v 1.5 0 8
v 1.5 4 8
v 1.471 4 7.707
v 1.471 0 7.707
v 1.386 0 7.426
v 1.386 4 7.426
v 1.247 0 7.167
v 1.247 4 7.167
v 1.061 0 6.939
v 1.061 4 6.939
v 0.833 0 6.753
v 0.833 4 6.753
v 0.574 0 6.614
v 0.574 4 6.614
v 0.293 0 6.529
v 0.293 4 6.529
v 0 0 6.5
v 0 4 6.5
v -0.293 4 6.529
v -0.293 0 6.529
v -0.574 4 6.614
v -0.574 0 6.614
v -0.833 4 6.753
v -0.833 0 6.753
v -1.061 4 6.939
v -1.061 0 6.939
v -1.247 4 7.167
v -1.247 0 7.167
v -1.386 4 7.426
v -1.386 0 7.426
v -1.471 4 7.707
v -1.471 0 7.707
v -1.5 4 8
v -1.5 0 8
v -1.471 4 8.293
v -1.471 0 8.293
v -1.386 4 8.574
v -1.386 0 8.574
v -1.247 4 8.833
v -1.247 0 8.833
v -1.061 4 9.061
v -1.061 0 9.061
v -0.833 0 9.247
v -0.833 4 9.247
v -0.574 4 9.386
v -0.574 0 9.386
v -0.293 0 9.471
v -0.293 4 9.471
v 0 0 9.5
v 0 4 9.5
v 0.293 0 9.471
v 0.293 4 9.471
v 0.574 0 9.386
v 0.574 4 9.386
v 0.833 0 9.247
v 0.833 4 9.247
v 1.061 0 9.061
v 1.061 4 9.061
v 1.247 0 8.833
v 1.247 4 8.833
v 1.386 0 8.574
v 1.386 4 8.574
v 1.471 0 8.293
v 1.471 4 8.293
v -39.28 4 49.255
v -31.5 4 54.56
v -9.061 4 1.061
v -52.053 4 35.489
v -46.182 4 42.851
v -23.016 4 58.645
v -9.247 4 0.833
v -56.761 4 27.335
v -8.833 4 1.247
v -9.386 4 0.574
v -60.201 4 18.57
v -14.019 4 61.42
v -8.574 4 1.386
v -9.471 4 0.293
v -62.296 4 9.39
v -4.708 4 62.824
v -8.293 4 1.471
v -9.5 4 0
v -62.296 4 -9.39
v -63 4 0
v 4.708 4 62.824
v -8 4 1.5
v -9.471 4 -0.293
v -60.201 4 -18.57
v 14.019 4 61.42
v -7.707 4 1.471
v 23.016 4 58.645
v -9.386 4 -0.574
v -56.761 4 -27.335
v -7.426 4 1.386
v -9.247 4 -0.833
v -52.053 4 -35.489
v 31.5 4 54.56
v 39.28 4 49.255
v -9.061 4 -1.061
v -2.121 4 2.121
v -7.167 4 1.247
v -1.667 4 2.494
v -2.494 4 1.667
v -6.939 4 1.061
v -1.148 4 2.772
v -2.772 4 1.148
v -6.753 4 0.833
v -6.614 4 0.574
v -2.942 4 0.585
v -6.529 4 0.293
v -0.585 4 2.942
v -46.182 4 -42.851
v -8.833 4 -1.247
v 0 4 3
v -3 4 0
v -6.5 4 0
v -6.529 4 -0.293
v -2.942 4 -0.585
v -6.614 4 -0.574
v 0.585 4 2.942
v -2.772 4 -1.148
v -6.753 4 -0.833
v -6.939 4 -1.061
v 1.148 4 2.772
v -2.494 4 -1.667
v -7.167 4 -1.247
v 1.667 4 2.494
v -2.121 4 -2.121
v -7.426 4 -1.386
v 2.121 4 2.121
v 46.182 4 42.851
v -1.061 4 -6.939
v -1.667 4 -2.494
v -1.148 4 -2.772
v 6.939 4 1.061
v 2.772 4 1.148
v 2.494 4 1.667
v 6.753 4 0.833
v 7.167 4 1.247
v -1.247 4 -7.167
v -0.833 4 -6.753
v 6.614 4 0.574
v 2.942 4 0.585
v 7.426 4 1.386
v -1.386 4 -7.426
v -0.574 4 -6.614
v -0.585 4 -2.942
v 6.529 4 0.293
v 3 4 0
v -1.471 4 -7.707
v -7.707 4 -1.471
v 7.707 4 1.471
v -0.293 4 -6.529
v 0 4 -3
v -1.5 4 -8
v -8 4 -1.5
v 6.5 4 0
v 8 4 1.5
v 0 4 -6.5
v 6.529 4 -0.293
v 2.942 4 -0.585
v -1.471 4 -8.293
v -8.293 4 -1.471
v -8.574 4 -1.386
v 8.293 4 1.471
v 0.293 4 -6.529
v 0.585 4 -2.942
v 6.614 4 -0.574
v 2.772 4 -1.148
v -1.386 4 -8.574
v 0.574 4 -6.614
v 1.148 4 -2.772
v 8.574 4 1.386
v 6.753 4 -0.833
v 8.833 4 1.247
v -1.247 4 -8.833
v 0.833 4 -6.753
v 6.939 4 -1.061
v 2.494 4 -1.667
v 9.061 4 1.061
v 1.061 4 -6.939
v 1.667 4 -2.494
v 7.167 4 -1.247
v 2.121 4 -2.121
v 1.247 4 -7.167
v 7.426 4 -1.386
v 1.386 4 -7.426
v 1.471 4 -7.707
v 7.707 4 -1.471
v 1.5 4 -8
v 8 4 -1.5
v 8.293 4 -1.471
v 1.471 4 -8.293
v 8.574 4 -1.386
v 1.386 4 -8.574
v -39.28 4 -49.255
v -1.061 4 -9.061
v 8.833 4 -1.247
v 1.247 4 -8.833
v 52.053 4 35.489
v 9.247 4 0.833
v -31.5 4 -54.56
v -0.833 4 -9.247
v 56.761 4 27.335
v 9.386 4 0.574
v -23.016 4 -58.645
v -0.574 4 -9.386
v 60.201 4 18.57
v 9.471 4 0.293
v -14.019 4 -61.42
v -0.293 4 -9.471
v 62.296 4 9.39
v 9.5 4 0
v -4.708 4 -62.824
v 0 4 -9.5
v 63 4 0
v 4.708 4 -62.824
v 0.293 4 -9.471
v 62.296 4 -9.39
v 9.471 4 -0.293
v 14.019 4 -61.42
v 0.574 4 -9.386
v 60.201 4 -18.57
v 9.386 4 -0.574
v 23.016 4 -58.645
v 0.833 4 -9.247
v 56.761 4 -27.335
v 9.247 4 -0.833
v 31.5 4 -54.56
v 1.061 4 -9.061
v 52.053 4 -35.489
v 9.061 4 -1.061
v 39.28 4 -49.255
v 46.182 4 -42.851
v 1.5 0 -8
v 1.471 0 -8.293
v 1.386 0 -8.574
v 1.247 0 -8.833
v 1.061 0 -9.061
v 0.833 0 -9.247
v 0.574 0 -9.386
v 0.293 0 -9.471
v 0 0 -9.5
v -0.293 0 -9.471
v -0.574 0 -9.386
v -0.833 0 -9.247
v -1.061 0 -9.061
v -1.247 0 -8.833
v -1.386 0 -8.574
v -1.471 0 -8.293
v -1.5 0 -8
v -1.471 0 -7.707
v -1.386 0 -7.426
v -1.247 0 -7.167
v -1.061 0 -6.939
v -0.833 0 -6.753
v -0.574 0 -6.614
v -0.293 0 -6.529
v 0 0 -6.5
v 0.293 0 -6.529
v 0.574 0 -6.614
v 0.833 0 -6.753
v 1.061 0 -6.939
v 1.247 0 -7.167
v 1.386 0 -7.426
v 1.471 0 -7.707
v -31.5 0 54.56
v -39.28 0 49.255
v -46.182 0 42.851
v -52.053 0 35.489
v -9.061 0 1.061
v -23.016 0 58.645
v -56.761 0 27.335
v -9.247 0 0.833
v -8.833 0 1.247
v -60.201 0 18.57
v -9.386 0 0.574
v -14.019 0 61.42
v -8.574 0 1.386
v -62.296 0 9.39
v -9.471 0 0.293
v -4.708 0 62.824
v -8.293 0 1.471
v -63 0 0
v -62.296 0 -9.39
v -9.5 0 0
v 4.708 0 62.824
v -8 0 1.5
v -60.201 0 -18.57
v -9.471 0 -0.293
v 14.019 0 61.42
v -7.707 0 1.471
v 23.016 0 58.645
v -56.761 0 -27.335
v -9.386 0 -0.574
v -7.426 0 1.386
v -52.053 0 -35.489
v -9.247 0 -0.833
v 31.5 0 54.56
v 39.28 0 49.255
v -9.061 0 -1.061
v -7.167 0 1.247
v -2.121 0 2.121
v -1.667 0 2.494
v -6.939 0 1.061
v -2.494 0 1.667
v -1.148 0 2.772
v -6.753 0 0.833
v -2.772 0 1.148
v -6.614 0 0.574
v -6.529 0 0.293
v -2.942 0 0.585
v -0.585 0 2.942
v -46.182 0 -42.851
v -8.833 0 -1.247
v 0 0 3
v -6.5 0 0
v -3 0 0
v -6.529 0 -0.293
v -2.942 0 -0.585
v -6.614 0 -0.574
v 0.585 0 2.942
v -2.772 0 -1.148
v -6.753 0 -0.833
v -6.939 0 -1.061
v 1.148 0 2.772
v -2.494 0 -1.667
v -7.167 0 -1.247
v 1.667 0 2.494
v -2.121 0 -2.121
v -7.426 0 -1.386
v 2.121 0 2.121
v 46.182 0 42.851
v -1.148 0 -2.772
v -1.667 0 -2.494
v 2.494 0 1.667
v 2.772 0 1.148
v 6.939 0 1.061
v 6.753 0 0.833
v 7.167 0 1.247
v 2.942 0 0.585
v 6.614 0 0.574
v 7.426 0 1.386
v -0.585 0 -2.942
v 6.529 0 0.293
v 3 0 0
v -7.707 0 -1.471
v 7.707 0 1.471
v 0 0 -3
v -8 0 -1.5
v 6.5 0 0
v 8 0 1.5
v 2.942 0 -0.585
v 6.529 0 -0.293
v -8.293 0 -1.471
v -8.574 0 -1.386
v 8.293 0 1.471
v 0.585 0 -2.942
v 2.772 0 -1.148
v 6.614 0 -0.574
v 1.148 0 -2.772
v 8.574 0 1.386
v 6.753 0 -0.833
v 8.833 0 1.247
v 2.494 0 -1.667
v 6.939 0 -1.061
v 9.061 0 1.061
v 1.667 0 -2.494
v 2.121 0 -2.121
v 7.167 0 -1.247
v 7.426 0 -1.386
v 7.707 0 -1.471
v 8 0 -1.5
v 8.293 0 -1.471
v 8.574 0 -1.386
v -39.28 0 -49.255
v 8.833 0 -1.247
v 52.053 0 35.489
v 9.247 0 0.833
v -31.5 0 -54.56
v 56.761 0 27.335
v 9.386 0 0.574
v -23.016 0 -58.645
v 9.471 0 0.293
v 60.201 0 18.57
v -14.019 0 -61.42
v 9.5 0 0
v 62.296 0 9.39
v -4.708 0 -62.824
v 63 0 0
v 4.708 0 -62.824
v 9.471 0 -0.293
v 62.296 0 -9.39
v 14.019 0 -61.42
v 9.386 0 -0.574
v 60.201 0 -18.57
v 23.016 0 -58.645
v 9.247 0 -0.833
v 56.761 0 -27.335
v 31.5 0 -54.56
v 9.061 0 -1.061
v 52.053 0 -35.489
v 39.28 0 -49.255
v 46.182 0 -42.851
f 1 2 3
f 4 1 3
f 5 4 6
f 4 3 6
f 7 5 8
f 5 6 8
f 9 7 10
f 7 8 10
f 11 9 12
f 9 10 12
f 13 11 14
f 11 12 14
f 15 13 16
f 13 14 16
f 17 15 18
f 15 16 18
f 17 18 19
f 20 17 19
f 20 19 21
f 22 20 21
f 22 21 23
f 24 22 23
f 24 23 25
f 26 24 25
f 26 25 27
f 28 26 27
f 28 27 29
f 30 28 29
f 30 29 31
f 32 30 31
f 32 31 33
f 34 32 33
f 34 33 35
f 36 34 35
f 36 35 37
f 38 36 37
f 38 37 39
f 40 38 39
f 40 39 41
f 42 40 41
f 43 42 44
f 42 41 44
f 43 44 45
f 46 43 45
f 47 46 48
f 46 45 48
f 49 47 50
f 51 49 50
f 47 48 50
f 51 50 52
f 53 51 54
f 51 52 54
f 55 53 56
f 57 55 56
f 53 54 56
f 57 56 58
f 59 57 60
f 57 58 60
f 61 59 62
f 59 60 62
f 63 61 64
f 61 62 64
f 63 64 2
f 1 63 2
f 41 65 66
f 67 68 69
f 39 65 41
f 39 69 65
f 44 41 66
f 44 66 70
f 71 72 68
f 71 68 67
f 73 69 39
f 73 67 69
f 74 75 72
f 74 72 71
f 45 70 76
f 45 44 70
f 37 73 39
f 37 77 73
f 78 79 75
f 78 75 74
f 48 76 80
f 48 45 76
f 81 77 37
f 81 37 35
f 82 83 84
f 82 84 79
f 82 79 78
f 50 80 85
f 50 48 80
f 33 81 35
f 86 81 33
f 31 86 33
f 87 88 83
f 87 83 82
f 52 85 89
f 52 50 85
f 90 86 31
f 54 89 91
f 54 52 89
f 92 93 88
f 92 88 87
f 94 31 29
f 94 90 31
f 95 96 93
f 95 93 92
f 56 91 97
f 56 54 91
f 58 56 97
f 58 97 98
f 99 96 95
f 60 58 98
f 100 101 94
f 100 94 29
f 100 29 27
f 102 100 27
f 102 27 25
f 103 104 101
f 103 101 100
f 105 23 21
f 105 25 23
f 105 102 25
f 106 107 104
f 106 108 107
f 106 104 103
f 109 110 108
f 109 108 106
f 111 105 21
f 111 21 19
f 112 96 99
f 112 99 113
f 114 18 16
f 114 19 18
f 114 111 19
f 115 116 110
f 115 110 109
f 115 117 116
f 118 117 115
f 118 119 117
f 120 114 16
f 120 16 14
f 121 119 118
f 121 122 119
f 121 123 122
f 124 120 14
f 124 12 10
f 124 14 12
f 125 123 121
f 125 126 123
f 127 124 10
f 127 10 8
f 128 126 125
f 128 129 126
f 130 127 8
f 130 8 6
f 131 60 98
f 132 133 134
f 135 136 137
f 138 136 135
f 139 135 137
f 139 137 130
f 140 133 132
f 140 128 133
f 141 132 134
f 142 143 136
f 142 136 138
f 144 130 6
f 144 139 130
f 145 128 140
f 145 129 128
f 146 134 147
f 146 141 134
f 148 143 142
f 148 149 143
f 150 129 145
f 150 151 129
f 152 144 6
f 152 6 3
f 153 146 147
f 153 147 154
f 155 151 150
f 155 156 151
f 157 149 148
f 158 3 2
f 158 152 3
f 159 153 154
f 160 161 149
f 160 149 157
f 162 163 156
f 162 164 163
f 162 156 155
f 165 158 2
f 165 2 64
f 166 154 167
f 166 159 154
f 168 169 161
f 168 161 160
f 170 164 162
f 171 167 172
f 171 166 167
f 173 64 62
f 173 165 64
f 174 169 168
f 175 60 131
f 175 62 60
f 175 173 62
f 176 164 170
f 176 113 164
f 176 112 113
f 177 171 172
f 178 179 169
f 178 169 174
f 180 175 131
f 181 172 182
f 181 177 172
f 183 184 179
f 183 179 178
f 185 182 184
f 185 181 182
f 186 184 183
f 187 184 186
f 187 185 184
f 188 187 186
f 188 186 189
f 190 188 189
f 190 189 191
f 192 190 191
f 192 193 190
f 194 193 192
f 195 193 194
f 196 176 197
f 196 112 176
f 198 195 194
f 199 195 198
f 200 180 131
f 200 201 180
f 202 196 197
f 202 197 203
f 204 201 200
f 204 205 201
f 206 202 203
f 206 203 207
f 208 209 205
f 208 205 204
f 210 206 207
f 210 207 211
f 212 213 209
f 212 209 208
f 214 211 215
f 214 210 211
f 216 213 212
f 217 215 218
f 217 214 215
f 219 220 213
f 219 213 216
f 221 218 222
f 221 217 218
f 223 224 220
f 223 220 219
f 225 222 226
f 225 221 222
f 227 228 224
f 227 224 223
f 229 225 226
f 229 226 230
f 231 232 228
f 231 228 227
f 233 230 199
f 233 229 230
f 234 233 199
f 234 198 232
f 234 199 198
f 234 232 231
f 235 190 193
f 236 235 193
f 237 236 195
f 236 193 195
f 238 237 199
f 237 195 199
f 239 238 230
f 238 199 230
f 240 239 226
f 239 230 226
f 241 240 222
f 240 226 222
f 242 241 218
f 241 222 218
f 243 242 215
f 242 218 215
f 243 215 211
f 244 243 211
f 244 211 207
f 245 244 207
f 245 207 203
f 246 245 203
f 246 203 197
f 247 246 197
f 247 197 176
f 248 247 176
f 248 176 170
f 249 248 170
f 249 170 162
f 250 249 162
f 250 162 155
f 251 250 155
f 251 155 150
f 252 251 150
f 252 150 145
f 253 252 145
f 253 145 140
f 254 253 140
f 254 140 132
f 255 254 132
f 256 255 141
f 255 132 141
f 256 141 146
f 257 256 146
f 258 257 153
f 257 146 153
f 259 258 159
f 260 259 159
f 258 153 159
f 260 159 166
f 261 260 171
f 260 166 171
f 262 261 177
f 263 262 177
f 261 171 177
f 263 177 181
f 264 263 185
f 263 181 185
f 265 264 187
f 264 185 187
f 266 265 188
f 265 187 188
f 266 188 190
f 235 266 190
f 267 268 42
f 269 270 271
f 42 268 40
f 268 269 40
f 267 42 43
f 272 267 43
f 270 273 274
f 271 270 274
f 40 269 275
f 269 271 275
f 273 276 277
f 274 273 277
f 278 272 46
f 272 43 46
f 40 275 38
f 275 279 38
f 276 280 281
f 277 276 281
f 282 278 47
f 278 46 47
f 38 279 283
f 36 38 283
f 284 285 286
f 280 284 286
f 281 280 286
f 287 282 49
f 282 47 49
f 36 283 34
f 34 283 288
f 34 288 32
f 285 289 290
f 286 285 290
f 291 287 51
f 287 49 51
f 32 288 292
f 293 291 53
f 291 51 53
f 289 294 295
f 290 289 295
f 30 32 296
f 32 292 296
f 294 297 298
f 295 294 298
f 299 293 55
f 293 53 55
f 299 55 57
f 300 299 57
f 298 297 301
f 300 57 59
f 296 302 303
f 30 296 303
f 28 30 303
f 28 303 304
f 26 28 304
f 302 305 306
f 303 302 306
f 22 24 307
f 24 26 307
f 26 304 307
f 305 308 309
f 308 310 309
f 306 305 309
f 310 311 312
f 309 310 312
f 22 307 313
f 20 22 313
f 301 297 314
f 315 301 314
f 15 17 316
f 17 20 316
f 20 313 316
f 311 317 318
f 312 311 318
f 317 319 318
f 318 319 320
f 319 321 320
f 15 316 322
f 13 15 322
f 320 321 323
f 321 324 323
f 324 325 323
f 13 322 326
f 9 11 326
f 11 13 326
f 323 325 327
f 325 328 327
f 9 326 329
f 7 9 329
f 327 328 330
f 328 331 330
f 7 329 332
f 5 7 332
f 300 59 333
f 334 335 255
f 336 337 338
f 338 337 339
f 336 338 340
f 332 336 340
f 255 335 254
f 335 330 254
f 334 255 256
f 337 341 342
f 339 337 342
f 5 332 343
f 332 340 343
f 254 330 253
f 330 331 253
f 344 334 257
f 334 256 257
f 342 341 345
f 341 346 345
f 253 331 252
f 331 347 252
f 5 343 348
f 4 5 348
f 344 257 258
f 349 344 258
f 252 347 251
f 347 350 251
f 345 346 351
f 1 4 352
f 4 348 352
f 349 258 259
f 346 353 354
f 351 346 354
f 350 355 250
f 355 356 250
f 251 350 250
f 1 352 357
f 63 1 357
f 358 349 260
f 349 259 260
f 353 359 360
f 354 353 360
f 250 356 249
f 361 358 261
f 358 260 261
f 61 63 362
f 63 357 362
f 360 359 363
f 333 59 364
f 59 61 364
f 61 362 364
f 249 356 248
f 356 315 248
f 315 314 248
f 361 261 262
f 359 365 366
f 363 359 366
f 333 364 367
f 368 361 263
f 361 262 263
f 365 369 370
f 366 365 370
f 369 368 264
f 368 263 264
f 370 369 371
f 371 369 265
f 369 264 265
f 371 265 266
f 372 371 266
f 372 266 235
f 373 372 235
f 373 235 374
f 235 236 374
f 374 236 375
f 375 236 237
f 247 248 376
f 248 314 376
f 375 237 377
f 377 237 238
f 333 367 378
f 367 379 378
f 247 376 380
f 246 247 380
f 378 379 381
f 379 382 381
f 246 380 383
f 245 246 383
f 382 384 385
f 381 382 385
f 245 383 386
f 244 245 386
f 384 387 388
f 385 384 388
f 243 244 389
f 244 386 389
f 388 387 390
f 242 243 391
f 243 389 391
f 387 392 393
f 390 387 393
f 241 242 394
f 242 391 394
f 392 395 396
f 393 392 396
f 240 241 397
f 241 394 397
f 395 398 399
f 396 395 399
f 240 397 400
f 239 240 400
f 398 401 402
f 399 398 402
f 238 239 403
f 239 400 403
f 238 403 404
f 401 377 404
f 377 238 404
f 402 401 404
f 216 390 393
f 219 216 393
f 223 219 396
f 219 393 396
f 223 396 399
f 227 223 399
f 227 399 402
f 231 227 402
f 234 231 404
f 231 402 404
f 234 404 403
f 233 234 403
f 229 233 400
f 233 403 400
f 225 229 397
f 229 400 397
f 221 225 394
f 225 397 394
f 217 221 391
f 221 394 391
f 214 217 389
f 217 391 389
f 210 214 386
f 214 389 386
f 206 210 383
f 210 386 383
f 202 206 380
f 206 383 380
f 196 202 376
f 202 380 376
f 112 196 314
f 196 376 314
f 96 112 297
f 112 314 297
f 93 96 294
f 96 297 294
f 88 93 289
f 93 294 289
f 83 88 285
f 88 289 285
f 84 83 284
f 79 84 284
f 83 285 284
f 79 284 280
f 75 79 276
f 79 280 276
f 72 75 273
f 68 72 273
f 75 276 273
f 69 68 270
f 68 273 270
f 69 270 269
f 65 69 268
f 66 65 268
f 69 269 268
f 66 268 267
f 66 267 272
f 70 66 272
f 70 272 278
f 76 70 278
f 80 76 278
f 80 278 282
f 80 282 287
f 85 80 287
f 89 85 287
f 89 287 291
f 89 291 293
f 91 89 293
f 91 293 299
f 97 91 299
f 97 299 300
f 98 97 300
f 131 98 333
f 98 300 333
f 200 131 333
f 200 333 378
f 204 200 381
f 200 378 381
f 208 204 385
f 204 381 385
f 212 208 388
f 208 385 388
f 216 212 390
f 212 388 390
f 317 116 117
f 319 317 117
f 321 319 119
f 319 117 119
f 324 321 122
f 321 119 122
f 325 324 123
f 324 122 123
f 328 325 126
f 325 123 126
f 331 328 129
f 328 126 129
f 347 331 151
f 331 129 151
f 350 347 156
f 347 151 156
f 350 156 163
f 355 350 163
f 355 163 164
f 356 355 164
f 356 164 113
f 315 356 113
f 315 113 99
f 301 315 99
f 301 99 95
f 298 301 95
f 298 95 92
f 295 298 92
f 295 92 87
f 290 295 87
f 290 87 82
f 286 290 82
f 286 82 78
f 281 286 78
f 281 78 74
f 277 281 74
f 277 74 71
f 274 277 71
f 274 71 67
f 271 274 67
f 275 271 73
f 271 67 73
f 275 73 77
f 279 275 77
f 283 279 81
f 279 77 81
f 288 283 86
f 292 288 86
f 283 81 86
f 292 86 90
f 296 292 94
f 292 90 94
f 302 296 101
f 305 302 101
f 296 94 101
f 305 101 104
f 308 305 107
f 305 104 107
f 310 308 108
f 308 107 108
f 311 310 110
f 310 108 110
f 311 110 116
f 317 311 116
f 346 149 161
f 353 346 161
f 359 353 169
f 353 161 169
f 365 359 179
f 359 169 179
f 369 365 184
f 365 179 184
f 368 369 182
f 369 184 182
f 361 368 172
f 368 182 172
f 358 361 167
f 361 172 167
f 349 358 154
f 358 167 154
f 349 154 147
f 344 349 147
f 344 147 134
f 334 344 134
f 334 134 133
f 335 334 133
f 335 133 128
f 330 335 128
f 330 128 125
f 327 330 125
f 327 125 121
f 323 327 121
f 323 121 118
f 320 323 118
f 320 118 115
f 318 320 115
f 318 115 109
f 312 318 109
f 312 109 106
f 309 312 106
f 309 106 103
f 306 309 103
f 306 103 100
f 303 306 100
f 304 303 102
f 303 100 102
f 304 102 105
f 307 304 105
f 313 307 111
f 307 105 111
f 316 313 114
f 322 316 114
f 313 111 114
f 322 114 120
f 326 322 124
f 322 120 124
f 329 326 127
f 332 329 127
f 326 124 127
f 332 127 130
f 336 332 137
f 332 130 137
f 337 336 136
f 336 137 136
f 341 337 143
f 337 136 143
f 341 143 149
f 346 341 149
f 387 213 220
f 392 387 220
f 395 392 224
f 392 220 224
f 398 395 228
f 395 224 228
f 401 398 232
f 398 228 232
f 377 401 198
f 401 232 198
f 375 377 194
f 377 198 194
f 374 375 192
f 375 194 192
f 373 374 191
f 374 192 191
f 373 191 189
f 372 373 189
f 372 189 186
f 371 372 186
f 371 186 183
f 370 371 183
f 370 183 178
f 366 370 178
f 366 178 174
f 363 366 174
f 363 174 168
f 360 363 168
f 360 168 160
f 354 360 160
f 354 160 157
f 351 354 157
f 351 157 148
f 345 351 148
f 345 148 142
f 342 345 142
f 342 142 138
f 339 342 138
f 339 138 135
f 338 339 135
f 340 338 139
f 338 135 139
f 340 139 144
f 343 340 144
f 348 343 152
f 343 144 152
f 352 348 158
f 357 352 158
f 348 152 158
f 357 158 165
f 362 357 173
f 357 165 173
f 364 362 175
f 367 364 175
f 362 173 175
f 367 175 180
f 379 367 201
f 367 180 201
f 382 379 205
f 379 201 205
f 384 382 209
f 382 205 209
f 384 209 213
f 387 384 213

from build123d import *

# Parameters (mm, degrees)
SKETCH_1_R          = 63
EXTRUDE_1_DEPTH     = 4
SKETCH_2_R          = 1.5
SKETCH_2_R_2        = 3
CUT_EXTRUDE_1_DEPTH = 5


with BuildPart() as part:
    # 草图1 → 凸台-拉伸1 (new body)
    with BuildSketch(Plane(origin=(0, 0, 0), x_dir=(1, 0, 0), z_dir=(0, 1, 0))):
        Circle(SKETCH_1_R)
    extrude(amount=EXTRUDE_1_DEPTH)

    # 草图2 → 切除-拉伸1 (cut, through all)
    with BuildSketch(Plane(origin=(0, 4, 0), x_dir=(1, 0, 0), z_dir=(0, 1, 0))):
        with Locations((8, 0)):
            Circle(SKETCH_2_R)
        with Locations((0, 8)):
            Circle(SKETCH_2_R)
        with Locations((-8, 0)):
            Circle(SKETCH_2_R)
        with Locations((0, -8)):
            Circle(SKETCH_2_R)
        Circle(SKETCH_2_R_2)
    extrude(amount=-CUT_EXTRUDE_1_DEPTH, mode=Mode.SUBTRACT)


solid = part.part
